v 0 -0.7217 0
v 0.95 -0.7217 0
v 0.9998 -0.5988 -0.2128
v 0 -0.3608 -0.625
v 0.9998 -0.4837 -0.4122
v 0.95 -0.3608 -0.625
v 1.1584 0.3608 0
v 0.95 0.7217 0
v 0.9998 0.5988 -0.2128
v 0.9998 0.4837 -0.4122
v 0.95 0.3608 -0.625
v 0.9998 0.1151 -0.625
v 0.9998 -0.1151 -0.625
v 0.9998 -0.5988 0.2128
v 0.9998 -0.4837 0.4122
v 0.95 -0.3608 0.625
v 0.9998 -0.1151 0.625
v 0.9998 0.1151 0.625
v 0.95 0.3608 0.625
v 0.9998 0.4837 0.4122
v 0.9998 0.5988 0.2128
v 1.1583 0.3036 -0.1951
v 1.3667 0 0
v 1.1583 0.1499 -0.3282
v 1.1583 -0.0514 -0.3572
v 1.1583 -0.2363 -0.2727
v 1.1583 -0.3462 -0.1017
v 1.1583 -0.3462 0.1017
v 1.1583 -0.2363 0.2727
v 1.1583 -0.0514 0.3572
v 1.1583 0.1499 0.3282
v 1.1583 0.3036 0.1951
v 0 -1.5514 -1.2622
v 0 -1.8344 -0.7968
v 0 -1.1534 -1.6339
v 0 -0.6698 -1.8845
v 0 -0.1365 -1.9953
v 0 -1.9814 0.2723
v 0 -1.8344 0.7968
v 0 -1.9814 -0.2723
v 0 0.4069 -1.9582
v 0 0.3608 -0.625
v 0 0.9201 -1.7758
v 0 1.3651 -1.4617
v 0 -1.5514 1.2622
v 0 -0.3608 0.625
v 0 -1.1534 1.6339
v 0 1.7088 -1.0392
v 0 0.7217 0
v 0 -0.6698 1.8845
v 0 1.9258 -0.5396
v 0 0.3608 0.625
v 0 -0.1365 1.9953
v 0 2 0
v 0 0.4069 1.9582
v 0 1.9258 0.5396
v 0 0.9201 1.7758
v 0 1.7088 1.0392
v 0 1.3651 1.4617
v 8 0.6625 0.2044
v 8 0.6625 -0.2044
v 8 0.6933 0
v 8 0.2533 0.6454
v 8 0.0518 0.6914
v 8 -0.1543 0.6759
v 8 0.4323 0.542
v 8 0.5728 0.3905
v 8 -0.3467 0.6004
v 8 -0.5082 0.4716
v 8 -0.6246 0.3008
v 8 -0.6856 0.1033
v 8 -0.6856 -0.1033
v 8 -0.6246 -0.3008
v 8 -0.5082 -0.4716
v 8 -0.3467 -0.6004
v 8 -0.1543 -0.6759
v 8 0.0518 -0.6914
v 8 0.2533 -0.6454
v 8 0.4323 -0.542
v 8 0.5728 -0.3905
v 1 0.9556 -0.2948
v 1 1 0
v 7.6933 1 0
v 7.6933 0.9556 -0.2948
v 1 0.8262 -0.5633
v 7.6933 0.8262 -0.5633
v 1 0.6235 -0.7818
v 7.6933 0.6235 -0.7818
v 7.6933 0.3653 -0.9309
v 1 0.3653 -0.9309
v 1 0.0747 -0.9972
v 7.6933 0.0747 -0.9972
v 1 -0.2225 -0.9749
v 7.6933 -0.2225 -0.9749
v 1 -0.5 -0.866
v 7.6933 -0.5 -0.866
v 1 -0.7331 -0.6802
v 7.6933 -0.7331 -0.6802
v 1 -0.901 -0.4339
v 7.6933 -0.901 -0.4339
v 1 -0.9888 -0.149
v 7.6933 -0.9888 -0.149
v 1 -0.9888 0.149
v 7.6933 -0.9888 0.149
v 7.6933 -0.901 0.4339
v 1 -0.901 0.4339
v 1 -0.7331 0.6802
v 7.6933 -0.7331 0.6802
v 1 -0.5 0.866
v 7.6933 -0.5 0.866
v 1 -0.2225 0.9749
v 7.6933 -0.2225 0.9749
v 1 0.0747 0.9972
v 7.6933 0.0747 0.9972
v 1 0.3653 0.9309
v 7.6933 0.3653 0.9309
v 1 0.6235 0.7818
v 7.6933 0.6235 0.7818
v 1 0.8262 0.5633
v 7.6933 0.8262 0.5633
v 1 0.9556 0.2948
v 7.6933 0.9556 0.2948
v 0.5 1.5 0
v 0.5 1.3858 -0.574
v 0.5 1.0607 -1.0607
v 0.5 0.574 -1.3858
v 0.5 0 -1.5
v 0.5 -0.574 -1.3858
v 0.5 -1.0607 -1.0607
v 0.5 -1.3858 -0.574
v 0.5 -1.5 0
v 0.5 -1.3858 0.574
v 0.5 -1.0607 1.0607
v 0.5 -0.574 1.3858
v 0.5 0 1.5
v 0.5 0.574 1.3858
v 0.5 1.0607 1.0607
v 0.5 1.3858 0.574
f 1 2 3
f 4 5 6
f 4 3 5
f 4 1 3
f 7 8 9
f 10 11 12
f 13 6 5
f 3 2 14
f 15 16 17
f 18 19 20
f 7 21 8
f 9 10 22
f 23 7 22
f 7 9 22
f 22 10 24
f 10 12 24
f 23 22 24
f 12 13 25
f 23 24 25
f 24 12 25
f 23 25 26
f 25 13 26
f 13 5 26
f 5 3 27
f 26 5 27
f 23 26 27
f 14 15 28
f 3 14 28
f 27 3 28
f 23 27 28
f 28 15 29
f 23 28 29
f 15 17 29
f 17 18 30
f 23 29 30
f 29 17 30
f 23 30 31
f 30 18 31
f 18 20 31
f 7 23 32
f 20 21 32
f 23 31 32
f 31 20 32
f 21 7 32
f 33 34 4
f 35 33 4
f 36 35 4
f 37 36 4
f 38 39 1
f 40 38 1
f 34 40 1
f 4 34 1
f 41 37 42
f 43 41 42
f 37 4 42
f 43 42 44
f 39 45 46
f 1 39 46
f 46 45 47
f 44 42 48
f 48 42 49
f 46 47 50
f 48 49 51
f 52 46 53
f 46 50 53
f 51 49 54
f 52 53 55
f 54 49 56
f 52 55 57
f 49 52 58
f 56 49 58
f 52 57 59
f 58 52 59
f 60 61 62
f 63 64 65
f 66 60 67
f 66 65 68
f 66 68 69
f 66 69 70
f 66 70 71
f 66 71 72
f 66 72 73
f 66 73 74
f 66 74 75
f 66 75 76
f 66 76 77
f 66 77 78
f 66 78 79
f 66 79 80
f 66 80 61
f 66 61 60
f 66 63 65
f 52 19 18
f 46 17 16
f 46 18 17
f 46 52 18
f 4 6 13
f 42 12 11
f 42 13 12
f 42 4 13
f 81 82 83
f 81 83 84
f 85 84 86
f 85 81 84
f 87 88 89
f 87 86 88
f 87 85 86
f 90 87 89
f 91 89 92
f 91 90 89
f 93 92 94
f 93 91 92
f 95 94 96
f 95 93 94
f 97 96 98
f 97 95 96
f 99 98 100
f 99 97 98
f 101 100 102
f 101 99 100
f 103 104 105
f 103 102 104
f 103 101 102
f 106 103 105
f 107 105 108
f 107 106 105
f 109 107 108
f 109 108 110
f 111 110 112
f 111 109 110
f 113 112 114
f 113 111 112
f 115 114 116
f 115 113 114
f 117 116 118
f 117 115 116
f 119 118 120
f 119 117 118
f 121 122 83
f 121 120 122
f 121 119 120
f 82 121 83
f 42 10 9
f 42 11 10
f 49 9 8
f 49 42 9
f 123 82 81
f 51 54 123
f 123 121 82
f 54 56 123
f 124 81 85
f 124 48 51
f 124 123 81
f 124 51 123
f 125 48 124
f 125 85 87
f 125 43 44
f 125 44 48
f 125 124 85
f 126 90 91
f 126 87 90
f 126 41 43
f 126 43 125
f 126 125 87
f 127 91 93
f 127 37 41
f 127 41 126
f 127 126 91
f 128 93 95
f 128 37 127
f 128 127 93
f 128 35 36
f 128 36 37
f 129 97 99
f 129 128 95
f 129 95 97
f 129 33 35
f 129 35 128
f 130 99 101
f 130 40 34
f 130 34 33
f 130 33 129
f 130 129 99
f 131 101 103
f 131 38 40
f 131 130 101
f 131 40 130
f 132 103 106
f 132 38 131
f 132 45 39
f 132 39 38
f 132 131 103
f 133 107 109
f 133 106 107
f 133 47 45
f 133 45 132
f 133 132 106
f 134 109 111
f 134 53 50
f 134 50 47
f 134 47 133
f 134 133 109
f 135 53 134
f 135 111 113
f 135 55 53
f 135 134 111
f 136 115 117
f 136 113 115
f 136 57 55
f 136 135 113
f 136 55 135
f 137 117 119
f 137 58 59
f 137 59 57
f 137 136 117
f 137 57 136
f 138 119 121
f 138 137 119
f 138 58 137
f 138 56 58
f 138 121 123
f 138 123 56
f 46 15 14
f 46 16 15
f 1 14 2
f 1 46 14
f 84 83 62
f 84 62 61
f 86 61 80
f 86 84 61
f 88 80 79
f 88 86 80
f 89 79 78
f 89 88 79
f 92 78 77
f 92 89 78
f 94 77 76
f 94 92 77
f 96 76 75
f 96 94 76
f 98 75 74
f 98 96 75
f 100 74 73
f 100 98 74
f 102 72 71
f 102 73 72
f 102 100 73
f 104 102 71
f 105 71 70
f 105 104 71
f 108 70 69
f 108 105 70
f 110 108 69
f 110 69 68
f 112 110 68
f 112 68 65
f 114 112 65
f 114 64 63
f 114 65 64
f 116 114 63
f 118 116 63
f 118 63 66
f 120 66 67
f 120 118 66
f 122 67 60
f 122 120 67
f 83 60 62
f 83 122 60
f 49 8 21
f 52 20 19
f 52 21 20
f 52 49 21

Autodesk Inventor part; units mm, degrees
ref_plane "YZ Plane" through (0, 0, 0) normal (1, 0, 0) x (0, 1, 0)
ref_plane "XZ Plane" through (0, 0, 0) normal (0, 1, 0) x (-1, 0, 0)
sketch "Sketch1" plane through (0, 0, 0) normal (0, 0, 1) x (1, 0, 0)
  line L0 (8, 0) -> (8, 1)
  line L1 (8, 1) -> (2.95, 1)
  line L2 (2.95, 1) -> (2.6433, 1)
  line L3 (0, 2) -> (0, 0.7217)
  line L4 (0, 0.7217) -> (0.95, 0.7217)
  line L5 (0.95, 0.7217) -> (1.3667, 0)
  line L6 (1.3667, 0) -> (8, 0)
  line L7 (0, 2) -> (0, 2)
  line L8 (0, 2) -> (1, 1)
  line L9 (2.6433, 1) -> (1, 1)
  line L10 (2.95, 1) -> (1, 1) construction
  line L11 (1, 1) -> (1, 1)
  line L12 (-1.6, 0) -> (9.6, 0) projected
  line L13 (0, -0.4) -> (0, 2.4) projected
  dimension "d0" = 8
  dimension "d1" = 5.05
  dimension "d2" = 0.95
  dimension "d3" = 2
  dimension "d6" = 1
  dimension "d7" = 45
  dimension "d8" = 1.4434
  dimension "d9" = 60
  dimension "d10" = 4
  dimension "d11" = 2
  dimension "d12" = 0.3067
revolve "Body" add sketch "Sketch1" angle 360 about axis through (1.3667, 0, 0) along (1, 0, 0) contours L6 L5 L4 L3 L8 L9 L2 L1 L0
thread "Thread" size "M2x0.4" class "6g" standard "ISO Metric profile" full length
chamfer "Chamfer1" distance 0.3067 distance2 0.3067 1 edges at (8, -1, 0) measured on face at (8, 0.202, 0.5327)
ref_plane "Work Plane1" through (104.775, 0, 0) normal (0, 0, -1) x (1, 0, 0)
sketch "Sketch4" plane through (0, 0, 0) normal (-1, 0, 0) x (0, 0, 1)
  circle A0 centre (0, 0) radius 0.7217 projected
  line L0 (0.625, -0.3608) -> (0, -0.7217)
  line L1 (0, -0.7217) -> (-0.625, -0.3608)
  line L2 (-0.625, -0.3608) -> (-0.625, 0.3608)
  line L3 (-0.625, 0.3608) -> (0, 0.7217)
  line L4 (0, 0.7217) -> (0.625, 0.3608)
  line L5 (0.625, 0.3608) -> (0.625, -0.3608)
  point P0 (0, 0)
  point P1 (0.625, 0.3608)
  point P2 (0.625, 0.3608)
  point P3 (0, 0.7217)
  point P4 (0, 0.7217)
  point P5 (-0.625, 0.3608)
  point P6 (-0.625, 0.3608)
  point P7 (0, -0.7217)
  point P8 (0, -0.7217)
extrude "Extrusion3" add sketch "Sketch4" against normal up to surface contours A0 L5 | L4 A0 | A0 L0 | L3 A0 | A0 L1 | L2 A0
equation "\"d17\" = -0.5 * SPD + 0.5 * GD"
equation "\"d18\" = GUL"
equation "\"d0\" = NLG"
equation "\"d1\" = GEL"
equation "\"d2\" = INTI"
equation "\"d3\" = GD"
equation "\"d6\" = KOH"
equation "\"d7\" = 0.5 * SEWI"
equation "\"d8\" = 1.1547 * SW"
equation "\"d10\" = KOD"
equation "\"d11\" = BDM"
equation "\"d12\" = GAL"
equation "\"NLG\" = 8"
equation "\"INTI\" = 0.95"
equation "\"GEL\" = 5.05"
equation "\"GAL\" = 0.61345 * PTC"
equation "\"KOH\" = 1"
equation "\"KOD\" = 4"
equation "\"GUL\" = 0.61345 * PTC"
equation "\"SPD\" = NND - 1.2269 * PTC"
equation "\"BDM\" = NND"
equation "\"GD\" = NND"
equation "\"SEWI\" = 90deg"
equation "\"SW\" = 1.25"
equation "\"TOA\" = 30deg"
equation "\"GD1\" = THREADDIA - 1.2269 * PTC"
equation "\"EPV\" = 3.2"
equation "\"THREADDIA\" = 3"
equation "\"PTC\" = 0.5"
equation "\"NND\" = 2"
equation "\"E0\" = 1.155 * SW"
properties part number "UNI 5933 - M3 x 8" material "Steel, Mild"
